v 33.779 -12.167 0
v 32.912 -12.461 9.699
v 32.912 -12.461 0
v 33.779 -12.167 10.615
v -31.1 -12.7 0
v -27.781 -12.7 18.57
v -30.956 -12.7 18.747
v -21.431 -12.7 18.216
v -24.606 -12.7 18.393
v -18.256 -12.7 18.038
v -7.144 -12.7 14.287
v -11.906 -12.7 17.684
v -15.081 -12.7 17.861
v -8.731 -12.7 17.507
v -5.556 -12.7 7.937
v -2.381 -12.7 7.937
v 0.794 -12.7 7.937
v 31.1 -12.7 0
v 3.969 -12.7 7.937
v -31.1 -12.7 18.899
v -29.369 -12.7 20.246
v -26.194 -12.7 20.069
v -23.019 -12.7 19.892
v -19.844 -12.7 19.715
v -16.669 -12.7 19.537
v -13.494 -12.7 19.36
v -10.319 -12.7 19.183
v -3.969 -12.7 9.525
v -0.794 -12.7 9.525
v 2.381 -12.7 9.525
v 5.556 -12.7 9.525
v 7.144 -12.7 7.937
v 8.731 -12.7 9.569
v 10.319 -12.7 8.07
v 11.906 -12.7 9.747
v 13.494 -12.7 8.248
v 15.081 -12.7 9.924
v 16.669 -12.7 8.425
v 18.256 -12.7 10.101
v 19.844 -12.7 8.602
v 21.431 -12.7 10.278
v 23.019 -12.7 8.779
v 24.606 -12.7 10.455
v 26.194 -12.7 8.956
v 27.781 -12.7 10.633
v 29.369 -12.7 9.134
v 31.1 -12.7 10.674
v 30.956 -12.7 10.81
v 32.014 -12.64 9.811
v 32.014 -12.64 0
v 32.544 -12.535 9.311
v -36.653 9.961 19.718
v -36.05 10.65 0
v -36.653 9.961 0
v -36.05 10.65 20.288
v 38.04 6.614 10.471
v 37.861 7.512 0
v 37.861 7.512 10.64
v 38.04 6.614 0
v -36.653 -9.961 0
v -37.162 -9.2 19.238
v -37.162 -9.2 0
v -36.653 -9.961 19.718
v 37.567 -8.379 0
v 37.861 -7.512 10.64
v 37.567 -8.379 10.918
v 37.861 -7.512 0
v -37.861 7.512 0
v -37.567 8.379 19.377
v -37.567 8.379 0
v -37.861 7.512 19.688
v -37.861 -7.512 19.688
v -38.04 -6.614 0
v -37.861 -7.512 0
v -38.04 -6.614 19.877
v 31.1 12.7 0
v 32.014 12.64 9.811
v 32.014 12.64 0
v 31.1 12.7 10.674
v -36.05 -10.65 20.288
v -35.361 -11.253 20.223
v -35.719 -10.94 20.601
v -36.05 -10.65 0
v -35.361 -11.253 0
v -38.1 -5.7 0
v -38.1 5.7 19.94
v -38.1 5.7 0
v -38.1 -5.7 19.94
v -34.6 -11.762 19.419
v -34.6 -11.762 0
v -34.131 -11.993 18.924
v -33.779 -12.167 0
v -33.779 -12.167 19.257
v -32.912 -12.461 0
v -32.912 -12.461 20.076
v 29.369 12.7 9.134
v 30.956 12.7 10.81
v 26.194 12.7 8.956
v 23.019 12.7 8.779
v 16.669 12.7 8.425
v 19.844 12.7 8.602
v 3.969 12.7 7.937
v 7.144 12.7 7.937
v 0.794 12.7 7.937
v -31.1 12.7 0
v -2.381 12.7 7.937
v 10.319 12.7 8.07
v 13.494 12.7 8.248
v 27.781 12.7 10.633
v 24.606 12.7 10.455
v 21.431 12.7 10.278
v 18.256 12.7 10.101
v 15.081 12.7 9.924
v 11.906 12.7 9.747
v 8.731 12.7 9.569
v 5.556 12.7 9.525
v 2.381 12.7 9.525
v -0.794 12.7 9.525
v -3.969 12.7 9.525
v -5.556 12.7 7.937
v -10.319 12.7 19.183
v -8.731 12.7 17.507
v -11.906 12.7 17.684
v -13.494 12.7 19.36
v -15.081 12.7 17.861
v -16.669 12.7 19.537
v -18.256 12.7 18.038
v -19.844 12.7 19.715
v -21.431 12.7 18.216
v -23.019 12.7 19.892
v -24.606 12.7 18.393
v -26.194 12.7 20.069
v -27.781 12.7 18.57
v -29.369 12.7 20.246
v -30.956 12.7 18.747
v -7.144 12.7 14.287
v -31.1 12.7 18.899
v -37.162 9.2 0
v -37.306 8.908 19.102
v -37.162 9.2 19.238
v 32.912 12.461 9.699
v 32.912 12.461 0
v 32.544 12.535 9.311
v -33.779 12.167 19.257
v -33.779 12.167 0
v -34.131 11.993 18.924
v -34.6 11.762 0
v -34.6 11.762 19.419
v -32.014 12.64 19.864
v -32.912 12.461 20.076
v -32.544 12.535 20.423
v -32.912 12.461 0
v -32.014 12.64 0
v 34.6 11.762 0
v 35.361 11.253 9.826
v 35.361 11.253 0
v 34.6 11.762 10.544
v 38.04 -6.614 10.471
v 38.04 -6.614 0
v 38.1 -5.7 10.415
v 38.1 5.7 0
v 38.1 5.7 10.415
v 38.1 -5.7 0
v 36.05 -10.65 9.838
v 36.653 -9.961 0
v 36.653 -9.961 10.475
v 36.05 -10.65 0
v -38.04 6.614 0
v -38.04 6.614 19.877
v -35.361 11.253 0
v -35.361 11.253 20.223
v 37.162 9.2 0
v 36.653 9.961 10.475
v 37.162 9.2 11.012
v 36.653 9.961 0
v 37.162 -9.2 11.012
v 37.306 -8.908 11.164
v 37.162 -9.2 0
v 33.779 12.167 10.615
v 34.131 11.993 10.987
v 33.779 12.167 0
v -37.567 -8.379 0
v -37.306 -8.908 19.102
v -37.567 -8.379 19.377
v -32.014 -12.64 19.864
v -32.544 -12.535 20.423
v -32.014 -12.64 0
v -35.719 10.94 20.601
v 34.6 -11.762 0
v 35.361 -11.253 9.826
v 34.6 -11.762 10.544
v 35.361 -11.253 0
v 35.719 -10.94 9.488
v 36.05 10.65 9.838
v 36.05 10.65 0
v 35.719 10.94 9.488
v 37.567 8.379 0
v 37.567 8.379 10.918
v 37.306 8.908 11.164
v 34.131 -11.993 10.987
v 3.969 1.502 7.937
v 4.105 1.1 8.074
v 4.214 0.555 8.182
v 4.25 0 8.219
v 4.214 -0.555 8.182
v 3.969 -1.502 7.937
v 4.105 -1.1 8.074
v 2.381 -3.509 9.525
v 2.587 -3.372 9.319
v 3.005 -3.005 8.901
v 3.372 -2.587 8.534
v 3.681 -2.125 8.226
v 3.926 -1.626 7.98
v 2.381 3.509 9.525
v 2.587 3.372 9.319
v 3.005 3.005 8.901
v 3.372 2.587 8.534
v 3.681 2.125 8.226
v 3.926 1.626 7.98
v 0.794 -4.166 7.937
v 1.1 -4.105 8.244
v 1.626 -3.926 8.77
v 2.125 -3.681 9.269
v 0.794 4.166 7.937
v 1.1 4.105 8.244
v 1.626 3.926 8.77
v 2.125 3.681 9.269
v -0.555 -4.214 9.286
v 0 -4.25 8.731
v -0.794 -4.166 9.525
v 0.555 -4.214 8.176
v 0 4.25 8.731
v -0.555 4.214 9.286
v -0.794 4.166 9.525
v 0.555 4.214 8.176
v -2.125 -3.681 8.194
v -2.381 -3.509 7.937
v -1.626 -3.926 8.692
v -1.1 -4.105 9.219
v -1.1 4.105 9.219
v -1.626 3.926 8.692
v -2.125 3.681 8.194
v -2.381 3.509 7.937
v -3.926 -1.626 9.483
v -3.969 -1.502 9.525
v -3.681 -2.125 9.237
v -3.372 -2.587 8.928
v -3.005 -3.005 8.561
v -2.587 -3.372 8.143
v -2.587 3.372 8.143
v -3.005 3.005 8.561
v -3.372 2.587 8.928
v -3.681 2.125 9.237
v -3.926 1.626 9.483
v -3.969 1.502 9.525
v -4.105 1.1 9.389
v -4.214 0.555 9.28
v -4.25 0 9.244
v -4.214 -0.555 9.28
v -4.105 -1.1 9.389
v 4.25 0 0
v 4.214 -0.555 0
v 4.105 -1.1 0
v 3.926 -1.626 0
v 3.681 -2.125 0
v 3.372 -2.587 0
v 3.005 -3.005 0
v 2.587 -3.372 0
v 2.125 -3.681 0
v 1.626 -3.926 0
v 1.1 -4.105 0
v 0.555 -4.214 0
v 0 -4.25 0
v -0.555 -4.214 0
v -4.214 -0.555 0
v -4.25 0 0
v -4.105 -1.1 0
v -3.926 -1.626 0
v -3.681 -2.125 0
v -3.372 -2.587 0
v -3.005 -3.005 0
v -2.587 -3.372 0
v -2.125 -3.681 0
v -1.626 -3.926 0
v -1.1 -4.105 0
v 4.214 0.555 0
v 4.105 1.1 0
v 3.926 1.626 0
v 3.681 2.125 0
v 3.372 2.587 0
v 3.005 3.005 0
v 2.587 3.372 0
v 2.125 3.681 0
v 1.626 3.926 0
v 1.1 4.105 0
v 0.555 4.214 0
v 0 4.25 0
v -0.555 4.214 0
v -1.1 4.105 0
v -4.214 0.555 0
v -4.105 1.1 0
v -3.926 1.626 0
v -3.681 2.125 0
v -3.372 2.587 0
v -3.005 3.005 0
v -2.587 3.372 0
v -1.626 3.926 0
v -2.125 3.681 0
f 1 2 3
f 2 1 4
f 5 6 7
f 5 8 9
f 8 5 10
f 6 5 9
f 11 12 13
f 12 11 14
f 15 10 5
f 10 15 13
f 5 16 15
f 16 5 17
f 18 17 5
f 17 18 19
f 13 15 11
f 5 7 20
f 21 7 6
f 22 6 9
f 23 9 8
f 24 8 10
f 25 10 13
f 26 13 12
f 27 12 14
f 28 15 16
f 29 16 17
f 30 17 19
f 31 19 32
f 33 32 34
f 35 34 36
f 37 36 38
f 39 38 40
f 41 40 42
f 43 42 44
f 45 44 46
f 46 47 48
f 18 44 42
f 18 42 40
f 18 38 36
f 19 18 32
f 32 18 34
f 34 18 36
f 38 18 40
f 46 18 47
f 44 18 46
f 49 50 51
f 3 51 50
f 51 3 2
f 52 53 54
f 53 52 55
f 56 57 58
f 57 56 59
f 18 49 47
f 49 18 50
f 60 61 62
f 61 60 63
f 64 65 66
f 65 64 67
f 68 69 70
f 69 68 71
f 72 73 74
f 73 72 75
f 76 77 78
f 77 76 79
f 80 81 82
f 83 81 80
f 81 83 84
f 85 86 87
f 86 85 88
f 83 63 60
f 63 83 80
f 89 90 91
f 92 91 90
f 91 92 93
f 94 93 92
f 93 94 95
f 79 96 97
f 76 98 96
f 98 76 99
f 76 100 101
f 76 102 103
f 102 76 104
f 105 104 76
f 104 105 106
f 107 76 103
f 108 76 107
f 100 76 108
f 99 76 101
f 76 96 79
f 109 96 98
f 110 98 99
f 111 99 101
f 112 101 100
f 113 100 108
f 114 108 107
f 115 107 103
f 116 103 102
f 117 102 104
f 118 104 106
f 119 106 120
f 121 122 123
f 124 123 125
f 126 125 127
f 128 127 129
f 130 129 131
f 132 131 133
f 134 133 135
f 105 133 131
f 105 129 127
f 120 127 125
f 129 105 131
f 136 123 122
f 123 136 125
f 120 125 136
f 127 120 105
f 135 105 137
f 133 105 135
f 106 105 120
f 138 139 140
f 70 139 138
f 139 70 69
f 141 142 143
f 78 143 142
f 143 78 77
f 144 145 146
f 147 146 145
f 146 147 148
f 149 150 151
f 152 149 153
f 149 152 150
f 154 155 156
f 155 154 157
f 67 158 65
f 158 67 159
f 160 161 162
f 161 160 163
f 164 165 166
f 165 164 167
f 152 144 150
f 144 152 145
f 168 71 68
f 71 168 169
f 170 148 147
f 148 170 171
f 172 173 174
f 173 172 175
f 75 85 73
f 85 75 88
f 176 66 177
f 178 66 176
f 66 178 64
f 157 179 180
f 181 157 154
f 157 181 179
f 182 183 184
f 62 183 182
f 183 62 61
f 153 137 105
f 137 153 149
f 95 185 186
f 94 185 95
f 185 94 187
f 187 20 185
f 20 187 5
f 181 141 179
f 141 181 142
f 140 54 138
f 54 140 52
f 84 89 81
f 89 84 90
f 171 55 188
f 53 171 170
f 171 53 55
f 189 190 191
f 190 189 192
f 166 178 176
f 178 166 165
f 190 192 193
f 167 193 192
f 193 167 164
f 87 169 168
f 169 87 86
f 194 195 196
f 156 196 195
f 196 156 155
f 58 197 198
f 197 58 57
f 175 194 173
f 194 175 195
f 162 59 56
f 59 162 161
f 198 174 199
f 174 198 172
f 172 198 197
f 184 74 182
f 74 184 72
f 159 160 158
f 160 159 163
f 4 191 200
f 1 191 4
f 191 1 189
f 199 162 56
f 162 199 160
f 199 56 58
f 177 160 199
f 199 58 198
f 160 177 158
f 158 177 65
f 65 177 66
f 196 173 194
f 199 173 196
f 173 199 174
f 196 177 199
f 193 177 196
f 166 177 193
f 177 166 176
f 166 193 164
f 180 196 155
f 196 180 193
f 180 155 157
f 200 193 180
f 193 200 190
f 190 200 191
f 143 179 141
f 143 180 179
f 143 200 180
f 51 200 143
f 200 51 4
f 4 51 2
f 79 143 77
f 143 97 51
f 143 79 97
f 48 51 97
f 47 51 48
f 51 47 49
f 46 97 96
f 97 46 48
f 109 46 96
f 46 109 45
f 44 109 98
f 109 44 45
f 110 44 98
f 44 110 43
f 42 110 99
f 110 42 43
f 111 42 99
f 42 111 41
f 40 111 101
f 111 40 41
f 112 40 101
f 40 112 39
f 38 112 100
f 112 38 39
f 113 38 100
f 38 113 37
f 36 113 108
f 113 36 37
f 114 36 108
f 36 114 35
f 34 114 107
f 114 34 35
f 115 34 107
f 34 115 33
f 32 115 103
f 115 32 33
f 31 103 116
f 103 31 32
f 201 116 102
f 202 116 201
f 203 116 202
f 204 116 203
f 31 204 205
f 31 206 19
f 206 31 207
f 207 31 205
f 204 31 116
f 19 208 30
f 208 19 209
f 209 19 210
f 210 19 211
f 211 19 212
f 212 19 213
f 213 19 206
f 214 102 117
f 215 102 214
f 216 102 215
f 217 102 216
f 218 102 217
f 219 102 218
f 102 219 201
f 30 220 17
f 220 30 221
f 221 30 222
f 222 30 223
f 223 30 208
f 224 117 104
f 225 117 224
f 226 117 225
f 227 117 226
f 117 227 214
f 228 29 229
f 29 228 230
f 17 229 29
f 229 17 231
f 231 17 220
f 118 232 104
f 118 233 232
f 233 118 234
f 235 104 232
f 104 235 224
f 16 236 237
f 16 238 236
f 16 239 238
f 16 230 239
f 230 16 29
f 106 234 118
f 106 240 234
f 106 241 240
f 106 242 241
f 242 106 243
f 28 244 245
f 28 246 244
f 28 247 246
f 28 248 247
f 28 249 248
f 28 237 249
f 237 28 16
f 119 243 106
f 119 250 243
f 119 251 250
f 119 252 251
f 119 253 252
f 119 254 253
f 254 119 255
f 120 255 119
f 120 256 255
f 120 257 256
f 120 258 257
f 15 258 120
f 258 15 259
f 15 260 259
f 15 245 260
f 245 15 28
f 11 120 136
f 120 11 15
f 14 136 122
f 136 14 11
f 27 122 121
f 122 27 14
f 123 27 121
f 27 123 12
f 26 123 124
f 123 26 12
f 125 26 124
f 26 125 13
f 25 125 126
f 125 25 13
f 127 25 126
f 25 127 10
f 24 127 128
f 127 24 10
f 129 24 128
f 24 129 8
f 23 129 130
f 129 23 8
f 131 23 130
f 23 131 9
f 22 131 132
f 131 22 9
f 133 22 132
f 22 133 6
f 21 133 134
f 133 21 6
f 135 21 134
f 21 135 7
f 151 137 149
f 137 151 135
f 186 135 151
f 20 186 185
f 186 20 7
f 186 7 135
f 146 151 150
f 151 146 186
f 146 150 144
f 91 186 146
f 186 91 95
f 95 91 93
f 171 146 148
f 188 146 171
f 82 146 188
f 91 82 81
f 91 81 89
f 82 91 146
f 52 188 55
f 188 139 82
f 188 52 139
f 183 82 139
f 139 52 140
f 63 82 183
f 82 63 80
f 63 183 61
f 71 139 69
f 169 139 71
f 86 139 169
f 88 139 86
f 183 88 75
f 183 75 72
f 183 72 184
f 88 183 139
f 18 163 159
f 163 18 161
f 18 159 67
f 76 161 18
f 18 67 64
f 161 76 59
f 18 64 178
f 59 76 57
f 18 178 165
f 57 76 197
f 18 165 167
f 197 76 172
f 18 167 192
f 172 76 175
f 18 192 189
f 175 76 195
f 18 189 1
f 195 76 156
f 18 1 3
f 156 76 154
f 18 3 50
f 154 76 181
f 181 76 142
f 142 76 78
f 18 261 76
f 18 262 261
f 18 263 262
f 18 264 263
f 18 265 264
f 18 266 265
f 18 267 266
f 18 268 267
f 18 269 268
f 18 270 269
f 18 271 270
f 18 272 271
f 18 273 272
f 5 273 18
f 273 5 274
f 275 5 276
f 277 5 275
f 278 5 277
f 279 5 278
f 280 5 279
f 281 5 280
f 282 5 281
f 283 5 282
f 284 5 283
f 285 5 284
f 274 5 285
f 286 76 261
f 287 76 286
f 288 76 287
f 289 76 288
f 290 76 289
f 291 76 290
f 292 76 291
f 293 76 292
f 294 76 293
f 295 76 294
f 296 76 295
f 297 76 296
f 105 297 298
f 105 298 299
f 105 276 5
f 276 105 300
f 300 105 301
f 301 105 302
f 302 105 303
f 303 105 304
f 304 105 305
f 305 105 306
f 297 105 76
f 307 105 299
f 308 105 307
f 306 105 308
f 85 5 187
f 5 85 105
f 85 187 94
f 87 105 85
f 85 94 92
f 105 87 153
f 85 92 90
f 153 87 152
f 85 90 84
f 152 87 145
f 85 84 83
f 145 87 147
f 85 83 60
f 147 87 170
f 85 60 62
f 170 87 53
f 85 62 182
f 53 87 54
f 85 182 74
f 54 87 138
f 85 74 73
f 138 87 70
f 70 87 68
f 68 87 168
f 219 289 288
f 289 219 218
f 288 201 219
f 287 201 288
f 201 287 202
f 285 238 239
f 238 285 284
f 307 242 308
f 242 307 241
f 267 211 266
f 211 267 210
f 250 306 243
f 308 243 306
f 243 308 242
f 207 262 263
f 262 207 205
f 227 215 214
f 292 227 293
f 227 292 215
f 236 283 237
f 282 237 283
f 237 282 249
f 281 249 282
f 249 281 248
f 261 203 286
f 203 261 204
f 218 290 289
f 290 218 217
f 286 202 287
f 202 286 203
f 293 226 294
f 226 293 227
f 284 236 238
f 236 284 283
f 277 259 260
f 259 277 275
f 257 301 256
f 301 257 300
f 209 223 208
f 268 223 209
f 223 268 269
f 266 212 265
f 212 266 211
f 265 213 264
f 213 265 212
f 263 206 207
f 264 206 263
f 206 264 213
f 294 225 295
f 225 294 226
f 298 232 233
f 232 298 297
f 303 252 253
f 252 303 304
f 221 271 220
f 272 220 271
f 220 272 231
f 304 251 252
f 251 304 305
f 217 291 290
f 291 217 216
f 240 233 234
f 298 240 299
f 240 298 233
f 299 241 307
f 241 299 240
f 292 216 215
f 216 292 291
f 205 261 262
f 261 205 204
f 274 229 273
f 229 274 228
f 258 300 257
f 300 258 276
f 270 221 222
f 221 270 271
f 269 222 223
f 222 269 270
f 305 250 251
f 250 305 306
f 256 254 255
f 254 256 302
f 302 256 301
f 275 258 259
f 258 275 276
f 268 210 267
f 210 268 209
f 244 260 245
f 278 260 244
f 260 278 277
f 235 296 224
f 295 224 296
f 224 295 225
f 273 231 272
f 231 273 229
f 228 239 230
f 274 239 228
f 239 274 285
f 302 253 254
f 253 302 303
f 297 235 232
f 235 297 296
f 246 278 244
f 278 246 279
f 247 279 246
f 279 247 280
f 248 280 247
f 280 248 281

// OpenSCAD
// file: ../lib/TOGArrayLib1.scad
// TOGArrayLib1.4
// 
// Functions for working with arrays.
// 
// v1.1:
// - tal1_reduce assert(is_list(items)) to prevent infinite recursion
//   when given undefined or other non-list values
// v1.1.1:
// - Fix tal1_uniq_remap_v2 to return "list-remap-result" as the
//   first element of the returned list
// v1.2:
// - Add tal1_replace_at function
// v1.3:
// - tal1_is_vec_of, tal1_is_vec_of_num
// v1.4:
// - tal1_assert_for_each, for when you want to assert something
//   about each of a list of items and get nice failure messages

/**
 * Make a list with the contents of list `a`,
 * but starting at offset `off`, replaced by the contents of list `b`.
 * len(result) = max(len(a), off+len(b))
 */
function tal1_replace_at(a, off, b, default_value=undef, default_value_function=undef) =
	assert(is_list(a))
	assert(is_list(b))
	let( _dvf = !is_undef(default_value_function) ? default_value_function : function(i) default_value )
[
	for( i=[0:1:min(off,len(a))-1] ) a[i],
	for( i=[len(a):1:off-1] ) _dvf(i),
	for( i=[off:1:off+len(b)-1] ) b[i-off],
	for( i=[off+len(b):1:len(a)-1] ) a[i],
];

// Simplest case
assert([] == tal1_replace_at([], 0, []));
// Second simplest cases
assert(["foo"] == tal1_replace_at(["foo"], 0, []));
assert(["foo"] == tal1_replace_at([], 0, ["foo"]));
// Replace one item
assert(["foo","quux","baz"] == tal1_replace_at(["foo","bar","baz"], 1, ["quux"]));
// Replace and extend
assert(["foo","quux","tuna","tina"] == tal1_replace_at(["foo","bar","baz"], 1, ["quux", "tuna", "tina"]));
// Add beyond end of `a`
assert(["foo","zzz","quux"] == tal1_replace_at(["foo"], 2, ["quux"], default_value="zzz"));
// Adding 'nothing' should still fill to that point with defaults
assert(["foo","zzz","zzz"] == tal1_replace_at(["foo"], 3, [], default_value="zzz"));


function tal1_reduce(start, items, func, offset=0) =
	assert(is_list(items))
	len(items) == offset ? start :
	tal1_reduce(func(start, items[offset]), items, func, offset+1);

function tal1_consecutive_duplicate_count(items) = tal1_reduce(
	[0, undef],
	items,
	function(z,item) [z[0] + (item == z[1] ? 1 : 0), item]
)[0];

assert(0 == tal1_consecutive_duplicate_count([]));
assert(0 == tal1_consecutive_duplicate_count([50]));
assert(1 == tal1_consecutive_duplicate_count([50,50]));
assert(0 == tal1_consecutive_duplicate_count([50,51,52,53]));
assert(1 == tal1_consecutive_duplicate_count([50,51,52,52]));
assert(3 == tal1_consecutive_duplicate_count([50,50,50,50]));

// Set test_size to arbirarily large values
// to ensure that OpenSCAD can handle heavy recursion
let(test_size=1000) assert(test_size/2 == tal1_consecutive_duplicate_count([for(i=[0:1:test_size-1]) floor(i/2)]));



function tal1_uniq_(items, off0, off1) =
	let(chunklen = off1-off0)
	chunklen == 0 ? [] :
	chunklen == 1 ? [items[off0]] :
	let(half=floor(chunklen/2))
	let(left  = tal1_uniq_(items, off0     , off0+half))
	let(right = tal1_uniq_(items, off0+half, off1     ))
	assert(len(left) > 0)
	assert(len(right) > 0)
	left[len(left)-1] == right[0] ? [each left, for(i=[1:1:len(right)-1]) right[i]] :
	[each left, each right];

/** Given a list of items, returns a new list with identical consecutive items merged */
function tal1_uniq(items) = tal1_uniq_(items, 0, len(items));

assert([] == tal1_uniq([]));
assert([123] == tal1_uniq([123]));
assert([55,0,1,2,3] == tal1_uniq([55,0,1,2,3]));
assert([55,0,1,2] == tal1_uniq([55,0,1,1,2]));
assert([55,0,1] == tal1_uniq([55,55,0,0,0,0,0,0,1,1,1,1]));
assert([55,0] == tal1_uniq([55,0,0,0,0,0,0,0]));



/**
 * Returns [new items, old index -> new index mapping].
 * No-op version.
 */
function tal1_uniq_remap_v1(items) =
	["list-remap-result", items, [for (vi=[0:1:len(items)-1]) vi]];

// [a, a, b, b, c, c]
//
// [a,    ...], []  -> [a],[0]
// [a, a, ...], [0] -> [a],[0,0]

assert([1,2,3] == [1,2,3]);

/**
 * Recursive version that will combine adjacent identical vertexes,
 * but will use the original items.
 */
function tal1_uniq_remap_v2(items, map=[]) =
	let(index = len(map))
	len(items) == index ? ["list-remap-result", items, map] :
	index == 0 ? tal1_uniq_remap_v2(items, [0]) :
	items[index] == items[map[index-1]] ? tal1_uniq_remap_v2(items, [for(vi=map) vi, map[index-1]]) :
	tal1_uniq_remap_v2(items, [for(vi=map) vi, index]);

assert(tal1_uniq_remap_v2([1,1,2,2,3,4]) == ["list-remap-result", [1,1,2,2,3,4], [0,0,2,2,4,5]]);


/**
 * Returns true if `vec` is a list of at least min_len items
 * and component_check(each item, even those beyond min_len) is true.
 */
function tal1_is_vec_of(vec, min_len=0, component_check=function(x) true) =
	assert(is_num(min_len) && min_len >= 0)
	assert(is_function(component_check))
	is_list(vec) && len(vec) >= min_len &&
	tal1_reduce(true, vec, function(prev,item) prev && component_check(item));

function tal1_is_vec_of_num(vec, min_len=0) = tal1_is_vec_of(vec, min_len, function(i) is_num(i));

assert( true == tal1_is_vec_of_num([1,2,3]));
assert( true == tal1_is_vec_of_num([]));
assert( true == tal1_is_vec_of_num([1,2,3], 3));
assert(false == tal1_is_vec_of_num([1,2], 3));
assert(false == tal1_is_vec_of_num([1,2,"spoon"], 3));
// Requirements are ambiguous when
// first min_len items are numbers, but there are non-numeric items afterwards,
// so let's error on the side of saying 'no, it's not a list of numbers';
// i.e. the item check and the min_len are independent.
assert(false == tal1_is_vec_of_num([1,2,3,"artichoke"], 3));


/**
 * Asserts that item_checker(each item in list, index of item)[0] is true.
 * Second element of item_checker return value is assertion message.
 * Returns the original list, in case that's useful to you.
 */
function tal1_assert_for_each(list, item_checker) =
	let( _ignored = [ for(i=[0:1:len(list)-1])
		let(q=item_checker(list[i],i))
		let(passed=is_bool(q) ? q : is_list(q) ? q[0] : assert(false, str(
			"tal1_assert_for_each: item_checker should return Bool|[Bool,String], but returned ",
			q, " for item at index ", i)))
		let(message=is_list(q) ? q[1] : undef)
		assert(passed, message)
		q
	])
	list;

// Callback can return a boolean...
assert([1,2,3] == tal1_assert_for_each([1,2,3], function(v,i) is_num(v)));
// ...or a [boolean, string]
assert([1,2,3] == tal1_assert_for_each([1,2,3], function(v,i) [is_num(v), "element be a num"]));
// file: ../lib/TOGMod1Constructors.scad
// TOGMod1Constructors-v1.7
// 
// Functions to construct objects understood by TOGMod1
// 
// v1.1:
// - Add togmod1_make_rounded_rect
// v1.2:
// - togmod1_make_rounded_rect can make ovals
// v1.3:
// - togmod1_circle_points, to just get the points of a circle
// - if pos parameter to circle function has a third element,
//   returned vertexes will include it as the z component;
// v1.3.1
// - Some assertions
// v1.4:
// - Refactor togmod1_rounded_rect_points and togmod1_circle_points
//   to use togmod1__make_nd_vector_adder for adapting to whatever
//   `pos` parameter is.
// v1.5:
// - togmod_rounded_rect_points will not simplify completely rounded sides
//   (where length of side is exactly twice the rounding radius)
//   unless simplify_rounded_sides=true
//   - This makes it more useful for polyhedron generation,
//     where radius varies, but number of points must remain constant.
// v1.6:
// - togmod1_make_rect makes a simple rectangle
// - togmod1_make_rounded_rect will defer to togmod1_make_rect when r=0
// v1.7:
// - togmod1_make_circle will return empty shape (["union"]) when d=0

use <./TOGArrayLib1.scad>

function togmod1__make_nd_vector_adder(origin=[0,0]) =
	let(origin_is_zero = tal1_reduce(true, origin, function(prev,item) prev && item == 0))
	origin_is_zero ? (function(vec) len(vec) >= len(origin) ? vec : tal1_replace_at(origin, 0, vec)) :
	function(vec) [
		for(i=[0:1:max(len(origin),len(vec))-1]) (len(vec) > i ? vec[i] : 0) + (len(origin) > i ? origin[i] : 0),
	];

assert([1,2,3] == togmod1__make_nd_vector_adder()([1,2,3]));
echo(togmod1__make_nd_vector_adder([0,0,3])([1,2]));
assert([1,2,3] == togmod1__make_nd_vector_adder([0,0,3])([1,2]));


function togmod1_make_cuboid(size) =
	assert(is_list(size))
	assert(len(size) >= 3)
	assert(is_num(size[0]))
	assert(is_num(size[1]))
	assert(is_num(size[2]))
	["polyhedron-vf", [
		[-size[0]/2, -size[1]/2, -size[2]/2],
		[+size[0]/2, -size[1]/2, -size[2]/2],
		[-size[0]/2, +size[1]/2, -size[2]/2],
		[+size[0]/2, +size[1]/2, -size[2]/2],
		[-size[0]/2, -size[1]/2, +size[2]/2],
		[+size[0]/2, -size[1]/2, +size[2]/2],
		[-size[0]/2, +size[1]/2, +size[2]/2],
		[+size[0]/2, +size[1]/2, +size[2]/2]
	], [
		[0,1,3,2],[0,4,5,1],[4,6,7,5],[3,7,6,2],[1,5,7,3],[6,4,0,2]
	]];

function togmod1_make_polygon(verts) =
	["polygon-vp", verts, [[for( i=[0:1:len(verts)-1] ) i%len(verts)]]];

function togmod1_rounded_rect_points(size, r, pos=[0,0], simplify_rounded_sides=false) =
	assert(is_list(size))
	assert(len(size) >= 2)
	let(radii = is_list(r) ? r : is_num(r) ? [r,r] : assert(false, "rounded_rect r(adius) should be list<num> or num"))
	let(rx = radii[0])
	let(ry = radii[1])
	assert(is_num(rx))
	assert(is_num(ry))
	assert(size[0] >= 2*rx, str("size[0] must be >= 2*r[0]; size[0] = ",size[0],", 2*r[0] = ",2*rx))
	assert(size[1] >= 2*ry, str("size[1] must be >= 2*r[1]; size[1] = ",size[1],", 2*r[1] = ",2*ry))
	let(quarterfn=max($fn/4, 1))
	let(qfnx = simplify_rounded_sides && size[0] == 2*rx ? quarterfn-1 : quarterfn)
	let(qfny = simplify_rounded_sides && size[1] == 2*ry ? quarterfn-1 : quarterfn)
	let(finalizepos = togmod1__make_nd_vector_adder(pos))
[
	for(a=[0 : 1 : qfnx]) let(ang=      a*90/quarterfn) finalizepos([ size[0]/2-rx + rx*cos(ang),  size[1]/2-ry + ry*sin(ang)]),
	for(a=[0 : 1 : qfny]) let(ang= 90 + a*90/quarterfn) finalizepos([-size[0]/2+rx + rx*cos(ang),  size[1]/2-ry + ry*sin(ang)]),
	for(a=[0 : 1 : qfnx]) let(ang=180 + a*90/quarterfn) finalizepos([-size[0]/2+rx + rx*cos(ang), -size[1]/2+ry + ry*sin(ang)]),
	for(a=[0 : 1 : qfny]) let(ang=270 + a*90/quarterfn) finalizepos([ size[0]/2-rx + rx*cos(ang), -size[1]/2+ry + ry*sin(ang)]),
];

function togmod1_make_rect(size) =
	togmod1_make_polygon([
		[-size[0]/2, -size[1]/2],
		[+size[0]/2, -size[1]/2],
		[+size[0]/2, +size[1]/2],
		[-size[0]/2, +size[1]/2],
	]);

function togmod1_make_rounded_rect(size, r) =
	r == 0 ? togmod1_make_rect(size) :
	togmod1_make_polygon(togmod1_rounded_rect_points(size,r,simplify_rounded_sides=true));

function togmod1_circle_points(r, pos=[0,0], d=undef) =
	assert( !is_undef(r) || !is_undef(d) )
	assert(!is_undef(pos[0]))
	assert(!is_undef(pos[1]))
	let(finalizepos = togmod1__make_nd_vector_adder(pos))
	let(r_ = !is_undef(r) ? r : d/2)
	let(fn = max($fn, 6))
	[for(i=[0 : 1 : fn-1]) finalizepos([r_*cos(i*360/fn), r_*sin(i*360/fn)])];

function togmod1_make_circle(r, pos=[0,0], d=undef) =
	r == 0 || d == 0 ? ["union"] :
	togmod1_make_polygon(togmod1_circle_points(r=r, pos=pos, d=d));

function togmod1_make_cylinder(d, zrange=[0,1], r=undef, pos=[0,0]) =
	assert( !is_undef(r) || !is_undef(d) )
	let( r_ = !is_undef(r) ? r : d/2 )
	// TODO: Make polyhedron directly
	["linear-extrude-zs", zrange, togmod1_make_circle(r=r_, pos=pos)];

function togmod1__is_range1d(range) = is_list(range) && len(range) == 2 && is_num(range[0]) && is_num(range[1]);

function togmod1_linear_extrude_z(range, shape) =
	assert(togmod1__is_range1d(range))
	["linear-extrude-zs", range, shape];
function togmod1_linear_extrude_x(range, shape) =
	assert(togmod1__is_range1d(range))
	["rotate", [90, 0, 90], togmod1_linear_extrude_z(range, shape)];
function togmod1_linear_extrude_y(range, shape) =
	assert(togmod1__is_range1d(range))
	["rotate", [90, 0, 180], togmod1_linear_extrude_z(range, shape)];
// file: ../lib/TOGMod1.scad
// TOGMod1
// OpenSCAD library for representing shapes
// 
// See also: Functional OpenSCAD (https://github.com/thehans/FunctionalOpenSCAD)

module togmod1_domodule(mod) {
	assert(is_list(mod));
	assert(len(mod) > 0);
	if( mod[0] == "polygon-vp" ) {
		// ["polygon-vp", vertexes, paths]
		polygon(points=mod[1], paths=mod[2]);
	} else if( mod[0] == "polyhedron-vf" ) {
		polyhedron(mod[1], faces=mod[2]);
	} else if( mod[0] == "scale" ) {
		assert(len(mod) == 3);
		scale(mod[1]) togmod1_domodule(mod[2]);
	} else if( mod[0] == "translate" ) {
		assert(len(mod) == 3);
		assert(is_list(mod[1]));
		for(c=mod[1]) assert(is_num(c), "translate component should be numeric");
		translate(mod[1]) togmod1_domodule(mod[2]);
	} else if( mod[0] == "rotate" ) {
		assert(len(mod) == 3);
		rotate(mod[1]) togmod1_domodule(mod[2]);
	} else if( mod[0] == "intersection" ) {
		intersection_for( i=[1:1:len(mod)-1] ) togmod1_domodule(mod[i]);
	} else if( mod[0] == "difference" ) {
		difference() {
			togmod1_domodule(mod[1]);
			for( i=[2:1:len(mod)-1] ) togmod1_domodule(mod[i]);
		}
	} else if( mod[0] == "union" ) {
		for( i=[1:1:len(mod)-1] ) togmod1_domodule(mod[i]);
	} else if( mod[0] == "hull" ) {
		hull() for( i=[1:1:len(mod)-1] ) togmod1_domodule(mod[i]);
	} else if( mod[0] == "offset-rs" ) {
		assert(len(mod) == 3);
		assert(is_num(mod[1]));
		assert(is_list(mod[2]));
		offset(mod[1]) togmod1_domodule(mod[2]);
	} else if( mod[0] == "linear-extrude-zs" ) {
		// ["linear-extrude-zs", [z0,z1], 2d_shape] // centered
		// ["linear-extrude-zs", height, 2d_shape]
		let( zrange = is_list(mod[1]) ? mod[1] : [-mod[1]/2, mod[1]/2] ) {
			translate([0,0,zrange[0]]) linear_extrude(zrange[1]-zrange[0]) togmod1_domodule(mod[2]);
		}
	} else if( mod[0] == "render" ) {
		render() togmod1_domodule(mod[1]);
	} else if( mod[0] == "minkowski" ) {
		minkowski() {
			togmod1_domodule(mod[1]);
			togmod1_domodule(mod[2]);
		}
	} else if( mod[0] == "x-debug" ) {
		# togmod1_domodule(mod[1]);
	} else if( mod[0] == "x-color" ) {
		color(mod[1]) togmod1_domodule(mod[2]);
	} else {
		assert(false, str("Unrecognized shape: ", mod[0]));
	}
}
// main file
// PanelConnector2.2
// 
// Improvements over old regular PanelConnector.scad:
// - Uses TOGMod1!
// - Option to make it L-shaped or U-shaped by setting left_jut_u or right_jut_u!
// - u = 1/16'
// 
// Changes:
// v2.1:
// - Fix zig size so that tooth pitch is 1/8" instead of 1/4"
// v2.2:
// - Offset zigs by 1/4 their pitch so that opposite connectors
//   can mash together satisfyingly

// Width of thing (u)
width_u = 16;
// Length of thing (u)
length_u = 48;
// Thickness of center section (u)
base_thickness_u = 6;
// How high shoud left section jut up above base (u)
left_jut_u = 6;
// How high shoud right section jut up above base (u)
right_jut_u = 0;
// Width of the flat center section (u)
center_width_u = 8;
// How much to slope upwards towards the ends
slope = 0.05; // 0.01

// Unit size numerator (mm)
u_num = 254;
// Unit size denominator
u_den = 160;

$fn = 48;

module __panelconnector2__end_params() { }

use <../lib/TOGMod1.scad>
use <../lib/TOGMod1Constructors.scad>
use <../lib/TOGPolyhedronLib1.scad>

function panelconnector2_make_xz_outline_points(length, top_z_func) =
	let( zig = u_num/u_den )
	let( len_zigs = ceil(length/zig/2)*2 )
	let( xz0 = -len_zigs/2, xz1 = len_zigs/2 )
	[
		[xz1*zig,              0],
		for( xz=[xz1 + 0.5 : -2 : xz0] ) each [
			[(xz  )*zig, top_z_func((xz  )*zig) + 0*zig],
			[(xz-1)*zig, top_z_func((xz-1)*zig) - 1*zig],
		],
		[xz0*zig,              0],
	];

togmod1_domodule(
	let( length = length_u * u_num / u_den )
	let( width  = width_u * u_num / u_den )
	let( the_top_z = function(x)
		let( u = u_num/u_den )
		let( t_b = base_thickness_u )
		let( t_l = left_jut_u )
		let( t_r = right_jut_u )
		let( lc  = center_width_u/2 )
		lookup(x, [
			[-length  , (t_b+t_l)*u + slope*length],
			[(-lc-1)*u, (t_b+t_l)*u               ],
			[(-lc  )*u, (t_b    )*u               ],
			[( lc  )*u, (t_b    )*u               ],
			[( lc+1)*u, (t_b+t_r)*u               ],
			[ length  , (t_b+t_r)*u + slope*length],
		])
	)
	["difference",
		["intersection",
			togmod1_linear_extrude_z([-50, 50], togmod1_make_rounded_rect([length, width], r=7)),
			
			togmod1_linear_extrude_y([-width, width], togmod1_make_polygon(panelconnector2_make_xz_outline_points(length, the_top_z))),
		],
		
		tphl1_make_z_cylinder(zrange=[-1, +51], d=8.5)
	]
);
